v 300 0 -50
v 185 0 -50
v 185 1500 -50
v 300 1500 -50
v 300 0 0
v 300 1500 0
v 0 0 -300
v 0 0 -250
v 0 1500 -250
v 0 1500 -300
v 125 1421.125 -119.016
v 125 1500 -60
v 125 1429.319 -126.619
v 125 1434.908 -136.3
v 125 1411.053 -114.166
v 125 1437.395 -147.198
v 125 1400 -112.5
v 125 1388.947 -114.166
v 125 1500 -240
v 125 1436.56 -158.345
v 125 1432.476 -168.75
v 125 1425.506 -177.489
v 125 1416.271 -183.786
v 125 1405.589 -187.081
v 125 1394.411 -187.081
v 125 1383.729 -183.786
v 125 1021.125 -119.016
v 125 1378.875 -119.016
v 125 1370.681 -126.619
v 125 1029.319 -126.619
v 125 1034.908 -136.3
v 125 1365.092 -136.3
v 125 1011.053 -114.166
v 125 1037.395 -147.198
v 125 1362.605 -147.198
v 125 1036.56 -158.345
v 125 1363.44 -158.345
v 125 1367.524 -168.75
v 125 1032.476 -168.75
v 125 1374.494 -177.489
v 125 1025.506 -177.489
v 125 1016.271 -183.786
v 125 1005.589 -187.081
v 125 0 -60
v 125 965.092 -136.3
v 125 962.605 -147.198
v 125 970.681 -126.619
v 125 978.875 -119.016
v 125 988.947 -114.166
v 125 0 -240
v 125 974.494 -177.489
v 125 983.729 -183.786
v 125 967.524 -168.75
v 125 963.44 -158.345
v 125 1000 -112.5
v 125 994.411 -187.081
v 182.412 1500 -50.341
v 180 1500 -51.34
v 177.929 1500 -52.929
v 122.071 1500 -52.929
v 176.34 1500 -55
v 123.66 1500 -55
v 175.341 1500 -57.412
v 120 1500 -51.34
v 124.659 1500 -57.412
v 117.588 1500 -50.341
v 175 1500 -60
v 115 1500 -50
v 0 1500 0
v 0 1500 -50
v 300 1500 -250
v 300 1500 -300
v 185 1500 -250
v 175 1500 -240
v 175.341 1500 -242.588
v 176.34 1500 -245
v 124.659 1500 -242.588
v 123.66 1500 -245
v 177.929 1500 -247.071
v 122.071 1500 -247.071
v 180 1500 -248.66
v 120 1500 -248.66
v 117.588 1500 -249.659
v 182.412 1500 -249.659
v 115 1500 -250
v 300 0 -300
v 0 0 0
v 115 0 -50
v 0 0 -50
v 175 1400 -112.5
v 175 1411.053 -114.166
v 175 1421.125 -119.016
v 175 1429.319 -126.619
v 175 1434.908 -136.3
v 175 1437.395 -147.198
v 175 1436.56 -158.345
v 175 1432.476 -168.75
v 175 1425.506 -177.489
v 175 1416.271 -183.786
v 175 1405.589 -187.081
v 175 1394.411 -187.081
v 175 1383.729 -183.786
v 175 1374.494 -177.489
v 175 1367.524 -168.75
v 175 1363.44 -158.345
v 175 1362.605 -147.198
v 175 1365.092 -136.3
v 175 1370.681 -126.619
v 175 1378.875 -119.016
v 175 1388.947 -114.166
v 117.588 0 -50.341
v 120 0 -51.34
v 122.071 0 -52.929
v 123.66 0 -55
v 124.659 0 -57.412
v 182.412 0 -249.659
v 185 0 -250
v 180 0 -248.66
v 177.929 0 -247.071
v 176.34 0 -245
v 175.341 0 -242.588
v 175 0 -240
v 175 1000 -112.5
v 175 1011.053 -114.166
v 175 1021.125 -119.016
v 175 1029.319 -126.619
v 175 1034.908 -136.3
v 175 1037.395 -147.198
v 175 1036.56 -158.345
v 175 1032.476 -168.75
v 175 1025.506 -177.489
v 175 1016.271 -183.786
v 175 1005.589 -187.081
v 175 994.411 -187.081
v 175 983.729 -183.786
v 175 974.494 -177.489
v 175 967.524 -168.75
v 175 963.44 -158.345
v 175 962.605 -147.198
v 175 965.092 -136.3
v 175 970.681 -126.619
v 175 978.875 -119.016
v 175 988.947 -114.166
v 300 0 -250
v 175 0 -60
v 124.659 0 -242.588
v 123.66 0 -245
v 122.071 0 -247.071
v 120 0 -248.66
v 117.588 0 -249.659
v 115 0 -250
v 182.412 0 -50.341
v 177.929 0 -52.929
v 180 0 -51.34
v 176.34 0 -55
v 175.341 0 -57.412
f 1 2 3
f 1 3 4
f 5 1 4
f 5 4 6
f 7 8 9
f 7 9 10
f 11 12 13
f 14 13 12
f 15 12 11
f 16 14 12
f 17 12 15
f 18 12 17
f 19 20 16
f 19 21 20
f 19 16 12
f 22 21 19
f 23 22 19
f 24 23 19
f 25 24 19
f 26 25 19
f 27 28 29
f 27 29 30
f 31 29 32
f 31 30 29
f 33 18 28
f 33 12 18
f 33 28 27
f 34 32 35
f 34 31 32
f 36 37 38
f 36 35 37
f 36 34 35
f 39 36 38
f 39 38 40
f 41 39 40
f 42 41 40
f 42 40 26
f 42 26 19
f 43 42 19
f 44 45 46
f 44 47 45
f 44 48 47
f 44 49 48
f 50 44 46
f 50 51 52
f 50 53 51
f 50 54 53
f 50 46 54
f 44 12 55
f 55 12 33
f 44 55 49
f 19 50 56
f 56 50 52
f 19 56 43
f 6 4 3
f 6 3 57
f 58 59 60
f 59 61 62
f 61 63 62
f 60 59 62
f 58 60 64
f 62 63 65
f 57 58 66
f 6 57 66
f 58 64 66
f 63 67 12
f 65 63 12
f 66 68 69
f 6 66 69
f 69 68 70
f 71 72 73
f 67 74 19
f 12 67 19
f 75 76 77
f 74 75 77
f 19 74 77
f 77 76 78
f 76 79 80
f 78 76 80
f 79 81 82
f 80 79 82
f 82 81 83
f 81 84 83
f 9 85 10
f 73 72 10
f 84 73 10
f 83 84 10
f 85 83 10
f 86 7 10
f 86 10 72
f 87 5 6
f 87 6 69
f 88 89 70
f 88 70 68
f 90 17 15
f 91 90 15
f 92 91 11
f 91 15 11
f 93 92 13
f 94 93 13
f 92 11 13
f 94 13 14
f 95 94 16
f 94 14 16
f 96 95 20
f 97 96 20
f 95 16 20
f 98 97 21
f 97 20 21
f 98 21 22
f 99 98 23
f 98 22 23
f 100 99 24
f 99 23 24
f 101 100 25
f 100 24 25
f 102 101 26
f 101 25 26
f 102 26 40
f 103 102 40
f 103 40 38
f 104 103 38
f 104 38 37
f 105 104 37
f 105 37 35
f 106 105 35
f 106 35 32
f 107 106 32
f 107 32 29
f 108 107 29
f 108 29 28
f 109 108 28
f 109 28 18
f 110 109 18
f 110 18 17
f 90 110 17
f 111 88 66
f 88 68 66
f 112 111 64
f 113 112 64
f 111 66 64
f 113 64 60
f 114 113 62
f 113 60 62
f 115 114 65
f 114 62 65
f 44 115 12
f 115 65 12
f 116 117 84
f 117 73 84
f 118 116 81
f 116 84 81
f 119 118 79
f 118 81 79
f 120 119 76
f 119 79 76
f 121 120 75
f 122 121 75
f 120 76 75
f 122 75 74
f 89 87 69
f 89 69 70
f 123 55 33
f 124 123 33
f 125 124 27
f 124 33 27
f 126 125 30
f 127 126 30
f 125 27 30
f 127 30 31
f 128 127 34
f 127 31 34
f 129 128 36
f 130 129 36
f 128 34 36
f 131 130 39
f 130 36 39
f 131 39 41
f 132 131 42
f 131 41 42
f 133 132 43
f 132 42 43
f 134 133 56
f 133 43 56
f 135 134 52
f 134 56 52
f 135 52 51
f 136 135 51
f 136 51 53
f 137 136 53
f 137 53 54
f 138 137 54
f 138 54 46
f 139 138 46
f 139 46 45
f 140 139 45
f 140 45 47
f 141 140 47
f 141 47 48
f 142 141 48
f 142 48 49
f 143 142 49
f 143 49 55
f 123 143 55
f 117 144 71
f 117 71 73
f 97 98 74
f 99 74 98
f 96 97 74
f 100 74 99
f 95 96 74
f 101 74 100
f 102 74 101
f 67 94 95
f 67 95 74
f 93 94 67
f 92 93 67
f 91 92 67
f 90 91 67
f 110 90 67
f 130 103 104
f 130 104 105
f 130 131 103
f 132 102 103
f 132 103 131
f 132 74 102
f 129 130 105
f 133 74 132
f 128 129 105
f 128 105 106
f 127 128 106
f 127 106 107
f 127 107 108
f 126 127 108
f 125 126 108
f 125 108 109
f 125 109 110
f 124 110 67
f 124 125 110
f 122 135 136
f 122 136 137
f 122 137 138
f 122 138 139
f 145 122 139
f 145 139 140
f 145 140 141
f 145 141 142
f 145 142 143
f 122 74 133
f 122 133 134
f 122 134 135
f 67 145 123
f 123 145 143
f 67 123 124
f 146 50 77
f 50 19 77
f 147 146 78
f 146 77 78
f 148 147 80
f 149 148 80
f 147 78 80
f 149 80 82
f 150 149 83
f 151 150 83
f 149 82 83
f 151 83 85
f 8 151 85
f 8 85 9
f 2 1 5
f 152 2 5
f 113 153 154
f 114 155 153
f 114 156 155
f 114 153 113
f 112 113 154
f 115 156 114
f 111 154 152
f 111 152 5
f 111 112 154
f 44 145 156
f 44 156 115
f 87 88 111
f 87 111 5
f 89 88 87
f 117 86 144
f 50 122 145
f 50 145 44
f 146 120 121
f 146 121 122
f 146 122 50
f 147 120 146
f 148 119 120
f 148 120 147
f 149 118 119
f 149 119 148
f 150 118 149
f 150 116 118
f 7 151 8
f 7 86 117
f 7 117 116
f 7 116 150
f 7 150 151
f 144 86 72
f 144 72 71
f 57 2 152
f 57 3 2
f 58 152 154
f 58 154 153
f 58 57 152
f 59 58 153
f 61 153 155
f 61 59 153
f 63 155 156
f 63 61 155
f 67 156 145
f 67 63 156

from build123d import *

# Parameters (mm, degrees)
BOSS_EXTRUDE1_DEPTH = 1500
FILLET1_R           = 10
SKETCH2_R           = 37.5
CUT_EXTRUDE1_DEPTH  = 1540.683409016


with BuildPart() as part:
    # Sketch1 → Boss-Extrude1 (new body)
    with BuildSketch(Plane(origin=(0, 0, 0), x_dir=(1, 0, 0), z_dir=(0, 1, 0))):
        Polygon((175, 50), (300, 50), (300, 0), (0, 0), (0, 50), (125, 50), (125, 250), (0, 250), (0, 300), (300, 300), (300, 250), (175, 250), align=None)
    extrude(amount=BOSS_EXTRUDE1_DEPTH)

    # Fillet1
    fillet1_edges = [part.edges().sort_by_distance(p)[0] for p in [
        (125, 750, -50),
        (125, 750, -250),
        (175, 750, -250),
        (175, 750, -50),
    ]]
    fillet(fillet1_edges, radius=FILLET1_R)

    # Sketch2 → Cut-Extrude1 (cut, through all)
    with BuildSketch(Plane.ZY.offset(-125)):
        with Locations((-150, 1400)):
            Circle(SKETCH2_R)
        with Locations((-150, 1000)):
            Circle(SKETCH2_R)
    extrude(amount=-CUT_EXTRUDE1_DEPTH, mode=Mode.SUBTRACT)


solid = part.part
